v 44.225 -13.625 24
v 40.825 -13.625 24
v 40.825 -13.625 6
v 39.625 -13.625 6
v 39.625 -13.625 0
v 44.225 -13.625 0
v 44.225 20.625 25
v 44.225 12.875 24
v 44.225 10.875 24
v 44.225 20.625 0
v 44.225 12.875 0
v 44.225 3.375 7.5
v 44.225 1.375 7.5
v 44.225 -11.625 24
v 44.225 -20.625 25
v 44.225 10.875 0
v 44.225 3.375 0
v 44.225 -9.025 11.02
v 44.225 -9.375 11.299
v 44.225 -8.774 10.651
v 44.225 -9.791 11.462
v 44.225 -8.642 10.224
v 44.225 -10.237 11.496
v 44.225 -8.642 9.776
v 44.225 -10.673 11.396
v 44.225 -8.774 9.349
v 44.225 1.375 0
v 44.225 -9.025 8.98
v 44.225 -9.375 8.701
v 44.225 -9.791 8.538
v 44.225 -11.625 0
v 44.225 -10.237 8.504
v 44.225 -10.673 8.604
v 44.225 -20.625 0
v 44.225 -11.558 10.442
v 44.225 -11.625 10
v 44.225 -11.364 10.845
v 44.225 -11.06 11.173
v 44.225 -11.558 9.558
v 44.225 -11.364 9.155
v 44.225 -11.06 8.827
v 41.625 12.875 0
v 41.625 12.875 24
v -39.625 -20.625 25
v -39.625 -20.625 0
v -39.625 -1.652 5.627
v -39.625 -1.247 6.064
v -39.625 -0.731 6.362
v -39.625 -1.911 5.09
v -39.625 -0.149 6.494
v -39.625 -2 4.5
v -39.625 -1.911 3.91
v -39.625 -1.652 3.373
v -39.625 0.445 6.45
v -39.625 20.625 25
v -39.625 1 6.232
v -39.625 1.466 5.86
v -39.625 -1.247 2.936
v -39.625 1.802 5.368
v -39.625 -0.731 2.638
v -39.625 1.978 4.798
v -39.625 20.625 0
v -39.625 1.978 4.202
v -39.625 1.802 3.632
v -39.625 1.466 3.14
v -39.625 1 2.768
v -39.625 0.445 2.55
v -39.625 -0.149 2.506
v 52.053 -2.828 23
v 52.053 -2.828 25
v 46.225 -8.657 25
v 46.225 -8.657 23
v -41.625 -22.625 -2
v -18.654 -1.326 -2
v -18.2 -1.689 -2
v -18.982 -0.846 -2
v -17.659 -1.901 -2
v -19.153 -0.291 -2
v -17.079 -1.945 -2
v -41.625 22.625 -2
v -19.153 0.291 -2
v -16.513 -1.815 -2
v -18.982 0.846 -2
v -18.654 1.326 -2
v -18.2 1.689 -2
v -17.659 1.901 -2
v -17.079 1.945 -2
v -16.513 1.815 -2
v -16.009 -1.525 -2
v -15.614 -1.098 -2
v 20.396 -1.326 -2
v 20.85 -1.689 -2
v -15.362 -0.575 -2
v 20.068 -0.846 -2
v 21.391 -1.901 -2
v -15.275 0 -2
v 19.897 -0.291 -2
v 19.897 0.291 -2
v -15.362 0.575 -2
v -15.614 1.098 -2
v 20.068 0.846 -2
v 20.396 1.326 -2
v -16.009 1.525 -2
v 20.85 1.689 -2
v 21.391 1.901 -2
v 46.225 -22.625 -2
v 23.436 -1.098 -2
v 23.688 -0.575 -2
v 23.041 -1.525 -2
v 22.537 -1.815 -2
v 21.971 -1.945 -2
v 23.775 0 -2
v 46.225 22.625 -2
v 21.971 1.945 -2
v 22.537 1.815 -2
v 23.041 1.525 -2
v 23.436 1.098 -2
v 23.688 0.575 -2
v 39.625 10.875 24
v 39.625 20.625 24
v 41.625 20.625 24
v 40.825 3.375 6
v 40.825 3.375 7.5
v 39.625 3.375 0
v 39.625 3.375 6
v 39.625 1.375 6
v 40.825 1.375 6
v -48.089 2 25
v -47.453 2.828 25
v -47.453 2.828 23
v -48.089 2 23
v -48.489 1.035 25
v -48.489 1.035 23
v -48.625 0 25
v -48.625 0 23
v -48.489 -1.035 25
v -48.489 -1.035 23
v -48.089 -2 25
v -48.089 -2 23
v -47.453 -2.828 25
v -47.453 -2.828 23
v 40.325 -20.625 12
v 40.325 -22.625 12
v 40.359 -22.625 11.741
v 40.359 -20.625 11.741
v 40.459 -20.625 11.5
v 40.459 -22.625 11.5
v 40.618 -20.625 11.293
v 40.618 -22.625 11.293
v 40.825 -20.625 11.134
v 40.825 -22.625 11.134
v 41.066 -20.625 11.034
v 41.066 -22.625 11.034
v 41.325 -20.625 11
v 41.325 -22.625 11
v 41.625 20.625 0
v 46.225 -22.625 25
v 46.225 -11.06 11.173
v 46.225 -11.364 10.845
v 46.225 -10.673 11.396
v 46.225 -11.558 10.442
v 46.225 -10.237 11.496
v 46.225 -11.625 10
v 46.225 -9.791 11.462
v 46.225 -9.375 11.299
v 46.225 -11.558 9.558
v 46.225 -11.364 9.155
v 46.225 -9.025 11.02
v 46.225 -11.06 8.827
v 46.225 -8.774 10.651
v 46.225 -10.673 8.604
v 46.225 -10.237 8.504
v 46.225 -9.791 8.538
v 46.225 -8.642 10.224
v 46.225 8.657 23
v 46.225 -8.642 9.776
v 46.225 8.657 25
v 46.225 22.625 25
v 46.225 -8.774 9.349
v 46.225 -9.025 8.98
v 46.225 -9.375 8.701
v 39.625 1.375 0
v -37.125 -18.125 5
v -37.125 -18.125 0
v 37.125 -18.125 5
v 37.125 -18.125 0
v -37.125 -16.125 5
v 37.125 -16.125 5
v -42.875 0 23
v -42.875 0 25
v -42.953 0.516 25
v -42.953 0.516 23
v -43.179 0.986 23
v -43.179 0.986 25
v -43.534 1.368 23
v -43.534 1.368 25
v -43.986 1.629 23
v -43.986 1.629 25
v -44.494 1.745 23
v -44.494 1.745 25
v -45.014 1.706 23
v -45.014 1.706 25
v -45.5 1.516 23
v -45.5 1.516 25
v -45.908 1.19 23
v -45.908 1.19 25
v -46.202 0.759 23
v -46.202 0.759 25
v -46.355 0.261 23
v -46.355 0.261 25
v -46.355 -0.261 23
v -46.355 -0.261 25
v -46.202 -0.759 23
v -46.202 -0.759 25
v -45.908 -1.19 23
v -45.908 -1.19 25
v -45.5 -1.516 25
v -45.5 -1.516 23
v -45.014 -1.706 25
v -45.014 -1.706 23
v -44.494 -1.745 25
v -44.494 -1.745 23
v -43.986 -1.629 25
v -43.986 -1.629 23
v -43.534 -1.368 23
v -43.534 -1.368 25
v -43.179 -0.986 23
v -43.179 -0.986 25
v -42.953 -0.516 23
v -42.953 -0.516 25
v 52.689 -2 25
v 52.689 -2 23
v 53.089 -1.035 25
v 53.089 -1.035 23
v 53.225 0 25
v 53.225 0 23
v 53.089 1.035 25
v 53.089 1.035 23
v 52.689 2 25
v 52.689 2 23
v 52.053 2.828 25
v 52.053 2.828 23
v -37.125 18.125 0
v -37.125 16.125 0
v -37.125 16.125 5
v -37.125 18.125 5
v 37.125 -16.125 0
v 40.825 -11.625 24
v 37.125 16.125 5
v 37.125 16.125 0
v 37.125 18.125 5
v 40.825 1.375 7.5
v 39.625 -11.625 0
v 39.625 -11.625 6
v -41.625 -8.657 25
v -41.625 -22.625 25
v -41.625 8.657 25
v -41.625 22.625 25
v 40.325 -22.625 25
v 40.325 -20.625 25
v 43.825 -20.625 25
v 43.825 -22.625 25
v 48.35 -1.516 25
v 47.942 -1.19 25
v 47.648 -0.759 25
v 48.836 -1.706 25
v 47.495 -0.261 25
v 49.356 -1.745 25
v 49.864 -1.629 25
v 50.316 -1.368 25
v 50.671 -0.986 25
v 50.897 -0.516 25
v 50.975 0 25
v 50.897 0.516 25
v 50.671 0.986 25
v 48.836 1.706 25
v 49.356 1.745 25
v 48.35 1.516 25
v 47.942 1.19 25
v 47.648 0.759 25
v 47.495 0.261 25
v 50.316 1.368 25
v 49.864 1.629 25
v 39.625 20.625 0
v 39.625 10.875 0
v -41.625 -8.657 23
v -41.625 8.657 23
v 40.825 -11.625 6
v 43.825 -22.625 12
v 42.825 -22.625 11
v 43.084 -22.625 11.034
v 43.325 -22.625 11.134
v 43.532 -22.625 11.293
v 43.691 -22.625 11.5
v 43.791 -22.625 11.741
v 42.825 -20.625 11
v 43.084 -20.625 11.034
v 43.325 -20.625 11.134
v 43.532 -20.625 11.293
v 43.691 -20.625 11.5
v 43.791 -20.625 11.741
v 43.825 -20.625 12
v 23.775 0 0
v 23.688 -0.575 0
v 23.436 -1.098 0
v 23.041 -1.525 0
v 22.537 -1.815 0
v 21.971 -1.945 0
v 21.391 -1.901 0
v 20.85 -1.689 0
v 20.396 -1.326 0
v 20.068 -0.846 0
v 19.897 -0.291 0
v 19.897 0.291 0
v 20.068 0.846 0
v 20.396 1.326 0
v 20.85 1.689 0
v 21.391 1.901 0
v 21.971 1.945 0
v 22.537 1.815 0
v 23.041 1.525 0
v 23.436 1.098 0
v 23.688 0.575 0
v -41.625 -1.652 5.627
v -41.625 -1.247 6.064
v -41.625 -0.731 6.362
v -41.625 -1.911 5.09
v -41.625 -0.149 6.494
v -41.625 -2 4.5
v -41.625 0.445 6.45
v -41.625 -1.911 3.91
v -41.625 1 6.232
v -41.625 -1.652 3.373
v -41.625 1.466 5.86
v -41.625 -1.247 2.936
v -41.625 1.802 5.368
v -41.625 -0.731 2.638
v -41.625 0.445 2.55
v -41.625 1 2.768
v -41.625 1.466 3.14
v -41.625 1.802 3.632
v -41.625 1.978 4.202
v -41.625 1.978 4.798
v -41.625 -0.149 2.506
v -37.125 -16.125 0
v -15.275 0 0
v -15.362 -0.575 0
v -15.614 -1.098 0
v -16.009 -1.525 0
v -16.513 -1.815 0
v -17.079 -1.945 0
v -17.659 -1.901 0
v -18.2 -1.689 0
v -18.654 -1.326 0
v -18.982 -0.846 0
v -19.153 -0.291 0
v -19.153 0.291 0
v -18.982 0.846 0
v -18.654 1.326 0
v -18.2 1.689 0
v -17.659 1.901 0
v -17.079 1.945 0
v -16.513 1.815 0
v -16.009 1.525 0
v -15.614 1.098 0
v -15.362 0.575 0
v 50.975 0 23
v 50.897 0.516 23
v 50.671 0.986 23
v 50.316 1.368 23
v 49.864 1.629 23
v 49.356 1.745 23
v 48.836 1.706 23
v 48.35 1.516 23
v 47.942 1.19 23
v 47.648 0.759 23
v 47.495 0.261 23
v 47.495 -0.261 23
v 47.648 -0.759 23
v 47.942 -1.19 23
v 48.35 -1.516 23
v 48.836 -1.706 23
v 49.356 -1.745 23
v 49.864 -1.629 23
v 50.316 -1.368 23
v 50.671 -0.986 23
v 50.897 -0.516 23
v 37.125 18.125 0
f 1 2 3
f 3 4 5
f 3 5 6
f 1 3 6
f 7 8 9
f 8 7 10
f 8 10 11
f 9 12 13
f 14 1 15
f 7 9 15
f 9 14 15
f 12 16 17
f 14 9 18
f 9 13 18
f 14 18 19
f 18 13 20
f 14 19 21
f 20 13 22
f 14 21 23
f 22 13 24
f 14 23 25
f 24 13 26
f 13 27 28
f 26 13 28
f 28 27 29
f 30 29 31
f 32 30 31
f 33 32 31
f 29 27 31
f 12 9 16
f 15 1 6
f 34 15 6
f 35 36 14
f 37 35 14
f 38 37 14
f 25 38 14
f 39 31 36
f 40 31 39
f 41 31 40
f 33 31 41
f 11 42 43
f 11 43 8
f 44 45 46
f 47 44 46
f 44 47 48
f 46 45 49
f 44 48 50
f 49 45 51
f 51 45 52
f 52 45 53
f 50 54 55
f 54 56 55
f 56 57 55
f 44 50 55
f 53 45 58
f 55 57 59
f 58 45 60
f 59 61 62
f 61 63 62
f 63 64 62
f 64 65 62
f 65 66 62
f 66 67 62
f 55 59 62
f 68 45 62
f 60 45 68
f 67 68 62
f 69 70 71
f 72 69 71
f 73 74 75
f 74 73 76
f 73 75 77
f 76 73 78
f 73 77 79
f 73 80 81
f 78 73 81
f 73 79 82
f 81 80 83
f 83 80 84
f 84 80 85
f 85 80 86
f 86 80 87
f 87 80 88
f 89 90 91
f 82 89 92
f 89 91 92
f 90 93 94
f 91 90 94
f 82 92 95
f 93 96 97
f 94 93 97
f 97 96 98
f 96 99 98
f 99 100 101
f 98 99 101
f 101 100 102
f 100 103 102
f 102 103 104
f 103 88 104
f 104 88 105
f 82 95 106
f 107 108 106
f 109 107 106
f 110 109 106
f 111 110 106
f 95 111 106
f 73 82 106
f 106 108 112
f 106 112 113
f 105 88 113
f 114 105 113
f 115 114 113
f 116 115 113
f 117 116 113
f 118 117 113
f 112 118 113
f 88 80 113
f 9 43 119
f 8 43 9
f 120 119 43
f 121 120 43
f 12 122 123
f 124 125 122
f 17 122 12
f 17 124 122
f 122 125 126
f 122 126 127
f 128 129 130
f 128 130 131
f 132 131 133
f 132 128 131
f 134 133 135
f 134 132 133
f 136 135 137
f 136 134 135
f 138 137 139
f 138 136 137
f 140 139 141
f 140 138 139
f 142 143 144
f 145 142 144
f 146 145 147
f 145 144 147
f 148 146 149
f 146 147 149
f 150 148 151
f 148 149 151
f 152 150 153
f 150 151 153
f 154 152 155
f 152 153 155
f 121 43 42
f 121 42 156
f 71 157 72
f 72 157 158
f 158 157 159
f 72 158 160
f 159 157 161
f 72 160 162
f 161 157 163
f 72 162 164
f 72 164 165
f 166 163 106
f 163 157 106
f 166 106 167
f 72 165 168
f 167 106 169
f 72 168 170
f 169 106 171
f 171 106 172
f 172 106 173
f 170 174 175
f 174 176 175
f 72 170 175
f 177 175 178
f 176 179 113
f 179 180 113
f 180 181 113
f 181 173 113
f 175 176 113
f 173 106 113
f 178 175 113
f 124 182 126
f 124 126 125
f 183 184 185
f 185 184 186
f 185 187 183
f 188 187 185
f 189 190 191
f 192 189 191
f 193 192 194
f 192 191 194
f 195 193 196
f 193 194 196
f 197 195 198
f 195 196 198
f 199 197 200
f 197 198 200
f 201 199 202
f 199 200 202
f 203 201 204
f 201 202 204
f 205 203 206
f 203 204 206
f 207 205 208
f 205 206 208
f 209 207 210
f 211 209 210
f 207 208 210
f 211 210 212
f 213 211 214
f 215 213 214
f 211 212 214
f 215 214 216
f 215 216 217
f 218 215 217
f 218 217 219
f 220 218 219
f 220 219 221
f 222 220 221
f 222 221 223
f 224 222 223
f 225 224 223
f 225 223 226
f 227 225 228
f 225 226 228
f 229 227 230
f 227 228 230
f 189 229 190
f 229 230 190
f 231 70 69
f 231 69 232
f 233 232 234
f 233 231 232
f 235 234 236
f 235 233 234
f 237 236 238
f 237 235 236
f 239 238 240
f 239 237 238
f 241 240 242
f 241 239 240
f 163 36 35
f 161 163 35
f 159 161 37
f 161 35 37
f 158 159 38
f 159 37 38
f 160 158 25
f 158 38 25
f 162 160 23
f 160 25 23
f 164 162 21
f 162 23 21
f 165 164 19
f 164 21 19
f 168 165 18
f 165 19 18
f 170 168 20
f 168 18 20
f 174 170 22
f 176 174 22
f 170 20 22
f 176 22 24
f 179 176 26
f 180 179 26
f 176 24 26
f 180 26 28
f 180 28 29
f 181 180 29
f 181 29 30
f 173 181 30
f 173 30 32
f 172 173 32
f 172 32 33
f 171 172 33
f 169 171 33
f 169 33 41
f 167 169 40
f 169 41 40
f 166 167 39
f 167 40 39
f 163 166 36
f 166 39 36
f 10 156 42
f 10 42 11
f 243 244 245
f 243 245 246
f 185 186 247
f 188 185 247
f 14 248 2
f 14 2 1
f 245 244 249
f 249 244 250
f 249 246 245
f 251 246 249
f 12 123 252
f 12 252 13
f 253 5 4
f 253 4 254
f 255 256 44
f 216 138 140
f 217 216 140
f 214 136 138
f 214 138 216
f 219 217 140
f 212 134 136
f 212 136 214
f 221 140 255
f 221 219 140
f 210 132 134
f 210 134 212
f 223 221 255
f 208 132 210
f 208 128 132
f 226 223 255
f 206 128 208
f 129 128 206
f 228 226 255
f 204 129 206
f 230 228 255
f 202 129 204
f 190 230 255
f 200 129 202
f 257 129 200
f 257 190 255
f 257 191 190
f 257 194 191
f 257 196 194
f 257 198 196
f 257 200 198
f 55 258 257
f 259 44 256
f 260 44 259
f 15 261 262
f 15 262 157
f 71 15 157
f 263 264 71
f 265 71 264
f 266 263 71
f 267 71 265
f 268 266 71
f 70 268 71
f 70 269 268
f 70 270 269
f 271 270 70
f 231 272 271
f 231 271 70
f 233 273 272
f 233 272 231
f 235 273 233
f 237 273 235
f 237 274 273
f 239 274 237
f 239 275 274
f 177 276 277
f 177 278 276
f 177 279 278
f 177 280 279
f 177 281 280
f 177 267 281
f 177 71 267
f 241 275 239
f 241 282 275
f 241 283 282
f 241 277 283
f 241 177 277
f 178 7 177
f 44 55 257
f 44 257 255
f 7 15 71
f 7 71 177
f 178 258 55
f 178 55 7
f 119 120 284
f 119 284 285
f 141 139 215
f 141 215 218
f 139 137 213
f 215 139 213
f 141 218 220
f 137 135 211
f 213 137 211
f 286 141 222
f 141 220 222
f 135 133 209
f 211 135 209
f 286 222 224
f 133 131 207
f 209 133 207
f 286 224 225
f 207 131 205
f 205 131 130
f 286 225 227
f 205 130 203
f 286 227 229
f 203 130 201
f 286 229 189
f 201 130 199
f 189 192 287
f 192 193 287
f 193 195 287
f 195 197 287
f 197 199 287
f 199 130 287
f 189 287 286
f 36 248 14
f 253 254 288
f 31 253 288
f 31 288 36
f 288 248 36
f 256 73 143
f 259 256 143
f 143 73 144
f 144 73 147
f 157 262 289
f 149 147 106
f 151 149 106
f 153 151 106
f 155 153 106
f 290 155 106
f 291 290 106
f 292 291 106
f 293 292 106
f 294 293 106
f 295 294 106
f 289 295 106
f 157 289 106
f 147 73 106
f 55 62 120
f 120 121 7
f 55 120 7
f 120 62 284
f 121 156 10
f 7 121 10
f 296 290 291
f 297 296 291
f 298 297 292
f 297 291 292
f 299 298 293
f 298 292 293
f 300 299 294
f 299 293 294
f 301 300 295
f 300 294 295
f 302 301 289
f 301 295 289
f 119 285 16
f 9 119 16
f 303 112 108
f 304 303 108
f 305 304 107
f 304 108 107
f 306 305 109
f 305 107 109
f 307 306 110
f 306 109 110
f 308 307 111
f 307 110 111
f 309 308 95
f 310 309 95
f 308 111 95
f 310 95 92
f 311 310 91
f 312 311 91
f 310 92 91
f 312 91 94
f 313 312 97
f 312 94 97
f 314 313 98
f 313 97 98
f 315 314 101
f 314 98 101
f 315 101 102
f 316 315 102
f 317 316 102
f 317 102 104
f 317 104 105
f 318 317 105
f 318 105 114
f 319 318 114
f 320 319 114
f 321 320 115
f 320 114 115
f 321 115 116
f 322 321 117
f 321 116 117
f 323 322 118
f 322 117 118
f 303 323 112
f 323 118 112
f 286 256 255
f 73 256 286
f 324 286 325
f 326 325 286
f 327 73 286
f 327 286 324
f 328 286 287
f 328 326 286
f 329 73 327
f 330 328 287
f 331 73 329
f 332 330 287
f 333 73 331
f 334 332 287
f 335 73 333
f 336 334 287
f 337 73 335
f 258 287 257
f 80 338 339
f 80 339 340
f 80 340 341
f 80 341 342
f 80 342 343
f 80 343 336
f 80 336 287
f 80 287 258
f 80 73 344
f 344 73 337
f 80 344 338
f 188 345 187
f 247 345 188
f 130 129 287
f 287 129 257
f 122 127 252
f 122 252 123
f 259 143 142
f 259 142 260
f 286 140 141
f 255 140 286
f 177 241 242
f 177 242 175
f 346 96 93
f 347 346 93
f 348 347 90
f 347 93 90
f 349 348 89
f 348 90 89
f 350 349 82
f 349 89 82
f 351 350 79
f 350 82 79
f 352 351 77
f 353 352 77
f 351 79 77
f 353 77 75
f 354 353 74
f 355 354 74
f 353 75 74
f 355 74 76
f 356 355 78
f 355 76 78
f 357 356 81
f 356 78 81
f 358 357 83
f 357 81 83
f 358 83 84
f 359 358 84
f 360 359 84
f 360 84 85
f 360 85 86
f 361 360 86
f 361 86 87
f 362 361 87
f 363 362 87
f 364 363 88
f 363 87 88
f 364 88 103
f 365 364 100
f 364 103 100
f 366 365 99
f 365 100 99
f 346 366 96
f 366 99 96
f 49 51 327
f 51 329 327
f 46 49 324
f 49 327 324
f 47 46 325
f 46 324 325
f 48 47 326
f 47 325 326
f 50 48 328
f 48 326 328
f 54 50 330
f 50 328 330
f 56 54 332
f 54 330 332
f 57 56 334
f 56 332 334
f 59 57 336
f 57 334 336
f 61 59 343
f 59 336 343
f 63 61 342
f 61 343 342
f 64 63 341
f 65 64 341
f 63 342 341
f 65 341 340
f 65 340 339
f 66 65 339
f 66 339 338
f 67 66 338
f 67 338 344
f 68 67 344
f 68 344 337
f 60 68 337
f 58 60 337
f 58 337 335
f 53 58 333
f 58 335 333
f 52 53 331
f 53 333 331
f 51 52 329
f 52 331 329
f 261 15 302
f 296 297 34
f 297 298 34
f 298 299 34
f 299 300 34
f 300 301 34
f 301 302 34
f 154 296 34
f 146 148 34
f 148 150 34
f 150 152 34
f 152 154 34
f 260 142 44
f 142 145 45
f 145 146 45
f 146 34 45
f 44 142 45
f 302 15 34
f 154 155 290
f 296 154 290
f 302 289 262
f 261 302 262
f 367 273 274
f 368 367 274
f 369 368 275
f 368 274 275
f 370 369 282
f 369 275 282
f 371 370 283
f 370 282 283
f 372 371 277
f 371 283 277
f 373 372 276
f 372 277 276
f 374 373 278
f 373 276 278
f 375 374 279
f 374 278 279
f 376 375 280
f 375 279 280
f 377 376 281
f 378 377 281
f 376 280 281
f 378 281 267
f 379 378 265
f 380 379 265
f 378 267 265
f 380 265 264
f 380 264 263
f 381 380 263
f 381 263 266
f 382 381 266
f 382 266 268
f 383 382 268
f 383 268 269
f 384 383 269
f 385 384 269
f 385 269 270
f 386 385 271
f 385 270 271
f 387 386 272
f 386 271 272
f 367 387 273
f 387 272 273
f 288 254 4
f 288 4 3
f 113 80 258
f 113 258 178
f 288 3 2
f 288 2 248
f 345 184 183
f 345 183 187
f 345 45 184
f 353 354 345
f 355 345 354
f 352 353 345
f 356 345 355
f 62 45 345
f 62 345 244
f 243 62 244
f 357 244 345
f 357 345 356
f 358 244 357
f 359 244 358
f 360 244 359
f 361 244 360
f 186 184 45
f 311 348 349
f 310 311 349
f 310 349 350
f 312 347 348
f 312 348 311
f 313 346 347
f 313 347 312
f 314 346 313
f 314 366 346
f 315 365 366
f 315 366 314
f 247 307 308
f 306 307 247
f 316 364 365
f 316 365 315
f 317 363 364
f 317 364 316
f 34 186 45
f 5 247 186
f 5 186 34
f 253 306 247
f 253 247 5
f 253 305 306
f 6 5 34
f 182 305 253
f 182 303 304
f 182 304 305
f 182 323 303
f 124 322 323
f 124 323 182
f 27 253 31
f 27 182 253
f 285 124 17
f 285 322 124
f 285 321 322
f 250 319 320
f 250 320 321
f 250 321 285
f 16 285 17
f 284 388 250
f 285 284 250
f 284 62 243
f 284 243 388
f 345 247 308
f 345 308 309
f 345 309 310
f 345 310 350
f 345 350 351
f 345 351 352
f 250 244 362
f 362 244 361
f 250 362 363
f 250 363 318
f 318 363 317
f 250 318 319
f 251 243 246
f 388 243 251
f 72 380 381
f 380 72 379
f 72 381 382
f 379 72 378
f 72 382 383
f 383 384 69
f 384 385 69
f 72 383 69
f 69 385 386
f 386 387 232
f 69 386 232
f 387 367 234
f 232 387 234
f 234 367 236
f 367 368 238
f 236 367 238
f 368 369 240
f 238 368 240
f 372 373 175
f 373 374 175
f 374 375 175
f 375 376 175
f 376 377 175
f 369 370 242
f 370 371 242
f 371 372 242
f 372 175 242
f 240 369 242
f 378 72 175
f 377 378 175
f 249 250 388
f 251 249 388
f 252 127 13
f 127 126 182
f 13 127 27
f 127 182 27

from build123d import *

# Parameters (mm, degrees)
SKETCH006_W          = 87.85
SKETCH006_H          = 45.25
PAD_DEPTH            = 2
SKETCH007_W          = 74.25
SKETCH007_H          = 2
PAD001_DEPTH         = 5
SKETCH008_W          = 87.85
SKETCH008_H          = 45.25
SKETCH008_W_2        = 2.6
SKETCH008_H_2        = 7.75
PAD002_DEPTH         = 25
SKETCH009_W          = 4.6
SKETCH009_H          = 2
PAD003_DEPTH         = 6
SKETCH010_W          = 3.4
SKETCH010_H          = 2
PAD004_DEPTH         = 18
SKETCH011_W          = 3.4
SKETCH011_H          = 2
PAD005_DEPTH         = 1.5
SKETCH013_W          = 4.6
SKETCH013_H          = 9.75
POCKET001_DEPTH      = 1
SKETCH016_R          = 2
POCKET003_DEPTH      = 2
POCKET003_DEPTH_BACK = 5
POCKET004_DEPTH      = 2
SKETCH044_R          = 1.75
PAD031_DEPTH         = 2
SKETCH070_R          = 1.95
POCKET_DEPTH         = 2
SKETCH086_R          = 1.5
POCKET019_DEPTH      = 2


with BuildPart() as part:
    # Sketch006 → Pad (new body)
    with BuildSketch(Plane.XY):
        with Locations((2.3, 0)):
            Rectangle(SKETCH006_W, SKETCH006_H)
    extrude(amount=PAD_DEPTH)

    # Sketch007 (on Face6 of Pad) → Pad001 (join)
    with BuildSketch(Plane.XY.offset(2)):
        with Locations((0, 17.125)):
            Rectangle(SKETCH007_W, SKETCH007_H)
        with Locations((0, -17.125)):
            Rectangle(SKETCH007_W, SKETCH007_H)
    extrude(amount=PAD001_DEPTH)

    # Sketch008 (on Face5 of Pad001) → Pad002 (join)
    with BuildSketch(Plane.XY.offset(2)):
        with Locations((2.3, 0)):
            Rectangle(SKETCH008_W, SKETCH008_H)
        Polygon((-39.625, 20.625), (39.625, 20.625), (39.625, 10.875), (44.225, 10.875), (44.225, -20.625), (-39.625, -20.625), align=None, mode=Mode.SUBTRACT)
        with Locations((42.925, 16.75)):
            Rectangle(SKETCH008_W_2, SKETCH008_H_2, mode=Mode.SUBTRACT)
    extrude(amount=PAD002_DEPTH)

    # Sketch009 (on Face6 of Pad) → Pad003 (join)
    with BuildSketch(Plane.XY.offset(2)):
        with Locations((41.925, 2.375)):
            Rectangle(SKETCH009_W, SKETCH009_H)
        with Locations((41.925, -12.625)):
            Rectangle(SKETCH009_W, SKETCH009_H)
    extrude(amount=PAD003_DEPTH)

    # Sketch010 (on Face26 of Pad003) → Pad004 (join)
    with BuildSketch(Plane.XY.offset(8)):
        with Locations((42.525, -12.625)):
            Rectangle(SKETCH010_W, SKETCH010_H)
    extrude(amount=PAD004_DEPTH)

    # Sketch011 (on Face23 of Pad003) → Pad005 (join)
    with BuildSketch(Plane.XY.offset(8)):
        with Locations((42.525, 2.375)):
            Rectangle(SKETCH011_W, SKETCH011_H)
    extrude(amount=PAD005_DEPTH)

    # Sketch013 (on Face9 of Pad002) → Pocket001 (cut)
    with BuildSketch(Plane.XY.offset(27)):
        with Locations((41.925, 15.75)):
            Rectangle(SKETCH013_W, SKETCH013_H)
    extrude(amount=-POCKET001_DEPTH, mode=Mode.SUBTRACT)

    # Sketch016 → Pocket003 (cut, two sides)
    with BuildSketch(Plane(origin=(-40.625, 0, 0), x_dir=(0, -1, 0), z_dir=(-1, 0, 0))) as pocket003_sk:
        with Locations((0, 6.5)):
            Circle(SKETCH016_R)
    extrude(amount=-POCKET003_DEPTH, mode=Mode.SUBTRACT)
    extrude(pocket003_sk.sketch, amount=POCKET003_DEPTH_BACK, mode=Mode.SUBTRACT)

    # Sketch017 (on Face5 of Pocket003) → Pocket004 (cut)
    with BuildSketch(Plane.XZ.offset(22.625)):
        with BuildLine():
            Line((40.325, 14), (40.325, 29))
            Line((40.325, 29), (43.825, 29))
            Line((43.825, 14), (43.825, 29))
            ThreePointArc((42.825, 13), (43.532107, 13.292893), (43.825, 14))
            Line((41.325, 13), (42.825, 13))
            ThreePointArc((40.325, 14), (40.617893, 13.292893), (41.325, 13))
        make_face()
    extrude(amount=-POCKET004_DEPTH, mode=Mode.SUBTRACT)

    # Sketch044 (on Face9 of Pad002) → Pad031 (join)
    with BuildSketch(Plane.XY.offset(27)):
        with BuildLine():
            ThreePointArc((-47.453427, 2.828427), (-48.625, 0), (-47.453427, -2.828427))
            Line((-47.453427, -2.828427), (-41.625, -8.656854))
            Line((-41.625, 8.656854), (-41.625, -8.656854))
            Line((-47.453427, 2.828427), (-41.625, 8.656854))
        make_face()
        with Locations((-44.625, 0)):
            Circle(SKETCH044_R, mode=Mode.SUBTRACT)
        with BuildLine():
            ThreePointArc((52.053427, -2.828427), (53.225, 0), (52.053427, 2.828427))
            Line((52.053427, 2.828427), (46.225, 8.656854))
            Line((46.225, -8.656854), (46.225, 8.656854))
            Line((52.053427, -2.828427), (46.225, -8.656854))
        make_face()
        with Locations((49.225, 0)):
            Circle(SKETCH044_R, mode=Mode.SUBTRACT)
    extrude(amount=-PAD031_DEPTH)

    # Sketch070 (on Face4 of Pad031) → Pocket (cut)
    with BuildSketch(Plane(origin=(0, 0, 0), x_dir=(1, 0, 0), z_dir=(0, 0, -1))):
        with Locations((-17.225, 0)):
            Circle(SKETCH070_R)
        with Locations((21.825, 0)):
            Circle(SKETCH070_R)
    extrude(amount=-POCKET_DEPTH, mode=Mode.SUBTRACT)

    # Sketch086 (on Face14 of Pad002) → Pocket019 (cut)
    with BuildSketch(Plane(origin=(44.225, 0, 0), x_dir=(0, -1, 0), z_dir=(-1, 0, 0))):
        with Locations((10.125, 12)):
            Circle(SKETCH086_R)
    extrude(amount=-POCKET019_DEPTH, mode=Mode.SUBTRACT)


with BuildPart() as part_1:
    # Body placement: moved
    add(part.part.moved(Location((0, 0, -2))))


solid = part_1.part
